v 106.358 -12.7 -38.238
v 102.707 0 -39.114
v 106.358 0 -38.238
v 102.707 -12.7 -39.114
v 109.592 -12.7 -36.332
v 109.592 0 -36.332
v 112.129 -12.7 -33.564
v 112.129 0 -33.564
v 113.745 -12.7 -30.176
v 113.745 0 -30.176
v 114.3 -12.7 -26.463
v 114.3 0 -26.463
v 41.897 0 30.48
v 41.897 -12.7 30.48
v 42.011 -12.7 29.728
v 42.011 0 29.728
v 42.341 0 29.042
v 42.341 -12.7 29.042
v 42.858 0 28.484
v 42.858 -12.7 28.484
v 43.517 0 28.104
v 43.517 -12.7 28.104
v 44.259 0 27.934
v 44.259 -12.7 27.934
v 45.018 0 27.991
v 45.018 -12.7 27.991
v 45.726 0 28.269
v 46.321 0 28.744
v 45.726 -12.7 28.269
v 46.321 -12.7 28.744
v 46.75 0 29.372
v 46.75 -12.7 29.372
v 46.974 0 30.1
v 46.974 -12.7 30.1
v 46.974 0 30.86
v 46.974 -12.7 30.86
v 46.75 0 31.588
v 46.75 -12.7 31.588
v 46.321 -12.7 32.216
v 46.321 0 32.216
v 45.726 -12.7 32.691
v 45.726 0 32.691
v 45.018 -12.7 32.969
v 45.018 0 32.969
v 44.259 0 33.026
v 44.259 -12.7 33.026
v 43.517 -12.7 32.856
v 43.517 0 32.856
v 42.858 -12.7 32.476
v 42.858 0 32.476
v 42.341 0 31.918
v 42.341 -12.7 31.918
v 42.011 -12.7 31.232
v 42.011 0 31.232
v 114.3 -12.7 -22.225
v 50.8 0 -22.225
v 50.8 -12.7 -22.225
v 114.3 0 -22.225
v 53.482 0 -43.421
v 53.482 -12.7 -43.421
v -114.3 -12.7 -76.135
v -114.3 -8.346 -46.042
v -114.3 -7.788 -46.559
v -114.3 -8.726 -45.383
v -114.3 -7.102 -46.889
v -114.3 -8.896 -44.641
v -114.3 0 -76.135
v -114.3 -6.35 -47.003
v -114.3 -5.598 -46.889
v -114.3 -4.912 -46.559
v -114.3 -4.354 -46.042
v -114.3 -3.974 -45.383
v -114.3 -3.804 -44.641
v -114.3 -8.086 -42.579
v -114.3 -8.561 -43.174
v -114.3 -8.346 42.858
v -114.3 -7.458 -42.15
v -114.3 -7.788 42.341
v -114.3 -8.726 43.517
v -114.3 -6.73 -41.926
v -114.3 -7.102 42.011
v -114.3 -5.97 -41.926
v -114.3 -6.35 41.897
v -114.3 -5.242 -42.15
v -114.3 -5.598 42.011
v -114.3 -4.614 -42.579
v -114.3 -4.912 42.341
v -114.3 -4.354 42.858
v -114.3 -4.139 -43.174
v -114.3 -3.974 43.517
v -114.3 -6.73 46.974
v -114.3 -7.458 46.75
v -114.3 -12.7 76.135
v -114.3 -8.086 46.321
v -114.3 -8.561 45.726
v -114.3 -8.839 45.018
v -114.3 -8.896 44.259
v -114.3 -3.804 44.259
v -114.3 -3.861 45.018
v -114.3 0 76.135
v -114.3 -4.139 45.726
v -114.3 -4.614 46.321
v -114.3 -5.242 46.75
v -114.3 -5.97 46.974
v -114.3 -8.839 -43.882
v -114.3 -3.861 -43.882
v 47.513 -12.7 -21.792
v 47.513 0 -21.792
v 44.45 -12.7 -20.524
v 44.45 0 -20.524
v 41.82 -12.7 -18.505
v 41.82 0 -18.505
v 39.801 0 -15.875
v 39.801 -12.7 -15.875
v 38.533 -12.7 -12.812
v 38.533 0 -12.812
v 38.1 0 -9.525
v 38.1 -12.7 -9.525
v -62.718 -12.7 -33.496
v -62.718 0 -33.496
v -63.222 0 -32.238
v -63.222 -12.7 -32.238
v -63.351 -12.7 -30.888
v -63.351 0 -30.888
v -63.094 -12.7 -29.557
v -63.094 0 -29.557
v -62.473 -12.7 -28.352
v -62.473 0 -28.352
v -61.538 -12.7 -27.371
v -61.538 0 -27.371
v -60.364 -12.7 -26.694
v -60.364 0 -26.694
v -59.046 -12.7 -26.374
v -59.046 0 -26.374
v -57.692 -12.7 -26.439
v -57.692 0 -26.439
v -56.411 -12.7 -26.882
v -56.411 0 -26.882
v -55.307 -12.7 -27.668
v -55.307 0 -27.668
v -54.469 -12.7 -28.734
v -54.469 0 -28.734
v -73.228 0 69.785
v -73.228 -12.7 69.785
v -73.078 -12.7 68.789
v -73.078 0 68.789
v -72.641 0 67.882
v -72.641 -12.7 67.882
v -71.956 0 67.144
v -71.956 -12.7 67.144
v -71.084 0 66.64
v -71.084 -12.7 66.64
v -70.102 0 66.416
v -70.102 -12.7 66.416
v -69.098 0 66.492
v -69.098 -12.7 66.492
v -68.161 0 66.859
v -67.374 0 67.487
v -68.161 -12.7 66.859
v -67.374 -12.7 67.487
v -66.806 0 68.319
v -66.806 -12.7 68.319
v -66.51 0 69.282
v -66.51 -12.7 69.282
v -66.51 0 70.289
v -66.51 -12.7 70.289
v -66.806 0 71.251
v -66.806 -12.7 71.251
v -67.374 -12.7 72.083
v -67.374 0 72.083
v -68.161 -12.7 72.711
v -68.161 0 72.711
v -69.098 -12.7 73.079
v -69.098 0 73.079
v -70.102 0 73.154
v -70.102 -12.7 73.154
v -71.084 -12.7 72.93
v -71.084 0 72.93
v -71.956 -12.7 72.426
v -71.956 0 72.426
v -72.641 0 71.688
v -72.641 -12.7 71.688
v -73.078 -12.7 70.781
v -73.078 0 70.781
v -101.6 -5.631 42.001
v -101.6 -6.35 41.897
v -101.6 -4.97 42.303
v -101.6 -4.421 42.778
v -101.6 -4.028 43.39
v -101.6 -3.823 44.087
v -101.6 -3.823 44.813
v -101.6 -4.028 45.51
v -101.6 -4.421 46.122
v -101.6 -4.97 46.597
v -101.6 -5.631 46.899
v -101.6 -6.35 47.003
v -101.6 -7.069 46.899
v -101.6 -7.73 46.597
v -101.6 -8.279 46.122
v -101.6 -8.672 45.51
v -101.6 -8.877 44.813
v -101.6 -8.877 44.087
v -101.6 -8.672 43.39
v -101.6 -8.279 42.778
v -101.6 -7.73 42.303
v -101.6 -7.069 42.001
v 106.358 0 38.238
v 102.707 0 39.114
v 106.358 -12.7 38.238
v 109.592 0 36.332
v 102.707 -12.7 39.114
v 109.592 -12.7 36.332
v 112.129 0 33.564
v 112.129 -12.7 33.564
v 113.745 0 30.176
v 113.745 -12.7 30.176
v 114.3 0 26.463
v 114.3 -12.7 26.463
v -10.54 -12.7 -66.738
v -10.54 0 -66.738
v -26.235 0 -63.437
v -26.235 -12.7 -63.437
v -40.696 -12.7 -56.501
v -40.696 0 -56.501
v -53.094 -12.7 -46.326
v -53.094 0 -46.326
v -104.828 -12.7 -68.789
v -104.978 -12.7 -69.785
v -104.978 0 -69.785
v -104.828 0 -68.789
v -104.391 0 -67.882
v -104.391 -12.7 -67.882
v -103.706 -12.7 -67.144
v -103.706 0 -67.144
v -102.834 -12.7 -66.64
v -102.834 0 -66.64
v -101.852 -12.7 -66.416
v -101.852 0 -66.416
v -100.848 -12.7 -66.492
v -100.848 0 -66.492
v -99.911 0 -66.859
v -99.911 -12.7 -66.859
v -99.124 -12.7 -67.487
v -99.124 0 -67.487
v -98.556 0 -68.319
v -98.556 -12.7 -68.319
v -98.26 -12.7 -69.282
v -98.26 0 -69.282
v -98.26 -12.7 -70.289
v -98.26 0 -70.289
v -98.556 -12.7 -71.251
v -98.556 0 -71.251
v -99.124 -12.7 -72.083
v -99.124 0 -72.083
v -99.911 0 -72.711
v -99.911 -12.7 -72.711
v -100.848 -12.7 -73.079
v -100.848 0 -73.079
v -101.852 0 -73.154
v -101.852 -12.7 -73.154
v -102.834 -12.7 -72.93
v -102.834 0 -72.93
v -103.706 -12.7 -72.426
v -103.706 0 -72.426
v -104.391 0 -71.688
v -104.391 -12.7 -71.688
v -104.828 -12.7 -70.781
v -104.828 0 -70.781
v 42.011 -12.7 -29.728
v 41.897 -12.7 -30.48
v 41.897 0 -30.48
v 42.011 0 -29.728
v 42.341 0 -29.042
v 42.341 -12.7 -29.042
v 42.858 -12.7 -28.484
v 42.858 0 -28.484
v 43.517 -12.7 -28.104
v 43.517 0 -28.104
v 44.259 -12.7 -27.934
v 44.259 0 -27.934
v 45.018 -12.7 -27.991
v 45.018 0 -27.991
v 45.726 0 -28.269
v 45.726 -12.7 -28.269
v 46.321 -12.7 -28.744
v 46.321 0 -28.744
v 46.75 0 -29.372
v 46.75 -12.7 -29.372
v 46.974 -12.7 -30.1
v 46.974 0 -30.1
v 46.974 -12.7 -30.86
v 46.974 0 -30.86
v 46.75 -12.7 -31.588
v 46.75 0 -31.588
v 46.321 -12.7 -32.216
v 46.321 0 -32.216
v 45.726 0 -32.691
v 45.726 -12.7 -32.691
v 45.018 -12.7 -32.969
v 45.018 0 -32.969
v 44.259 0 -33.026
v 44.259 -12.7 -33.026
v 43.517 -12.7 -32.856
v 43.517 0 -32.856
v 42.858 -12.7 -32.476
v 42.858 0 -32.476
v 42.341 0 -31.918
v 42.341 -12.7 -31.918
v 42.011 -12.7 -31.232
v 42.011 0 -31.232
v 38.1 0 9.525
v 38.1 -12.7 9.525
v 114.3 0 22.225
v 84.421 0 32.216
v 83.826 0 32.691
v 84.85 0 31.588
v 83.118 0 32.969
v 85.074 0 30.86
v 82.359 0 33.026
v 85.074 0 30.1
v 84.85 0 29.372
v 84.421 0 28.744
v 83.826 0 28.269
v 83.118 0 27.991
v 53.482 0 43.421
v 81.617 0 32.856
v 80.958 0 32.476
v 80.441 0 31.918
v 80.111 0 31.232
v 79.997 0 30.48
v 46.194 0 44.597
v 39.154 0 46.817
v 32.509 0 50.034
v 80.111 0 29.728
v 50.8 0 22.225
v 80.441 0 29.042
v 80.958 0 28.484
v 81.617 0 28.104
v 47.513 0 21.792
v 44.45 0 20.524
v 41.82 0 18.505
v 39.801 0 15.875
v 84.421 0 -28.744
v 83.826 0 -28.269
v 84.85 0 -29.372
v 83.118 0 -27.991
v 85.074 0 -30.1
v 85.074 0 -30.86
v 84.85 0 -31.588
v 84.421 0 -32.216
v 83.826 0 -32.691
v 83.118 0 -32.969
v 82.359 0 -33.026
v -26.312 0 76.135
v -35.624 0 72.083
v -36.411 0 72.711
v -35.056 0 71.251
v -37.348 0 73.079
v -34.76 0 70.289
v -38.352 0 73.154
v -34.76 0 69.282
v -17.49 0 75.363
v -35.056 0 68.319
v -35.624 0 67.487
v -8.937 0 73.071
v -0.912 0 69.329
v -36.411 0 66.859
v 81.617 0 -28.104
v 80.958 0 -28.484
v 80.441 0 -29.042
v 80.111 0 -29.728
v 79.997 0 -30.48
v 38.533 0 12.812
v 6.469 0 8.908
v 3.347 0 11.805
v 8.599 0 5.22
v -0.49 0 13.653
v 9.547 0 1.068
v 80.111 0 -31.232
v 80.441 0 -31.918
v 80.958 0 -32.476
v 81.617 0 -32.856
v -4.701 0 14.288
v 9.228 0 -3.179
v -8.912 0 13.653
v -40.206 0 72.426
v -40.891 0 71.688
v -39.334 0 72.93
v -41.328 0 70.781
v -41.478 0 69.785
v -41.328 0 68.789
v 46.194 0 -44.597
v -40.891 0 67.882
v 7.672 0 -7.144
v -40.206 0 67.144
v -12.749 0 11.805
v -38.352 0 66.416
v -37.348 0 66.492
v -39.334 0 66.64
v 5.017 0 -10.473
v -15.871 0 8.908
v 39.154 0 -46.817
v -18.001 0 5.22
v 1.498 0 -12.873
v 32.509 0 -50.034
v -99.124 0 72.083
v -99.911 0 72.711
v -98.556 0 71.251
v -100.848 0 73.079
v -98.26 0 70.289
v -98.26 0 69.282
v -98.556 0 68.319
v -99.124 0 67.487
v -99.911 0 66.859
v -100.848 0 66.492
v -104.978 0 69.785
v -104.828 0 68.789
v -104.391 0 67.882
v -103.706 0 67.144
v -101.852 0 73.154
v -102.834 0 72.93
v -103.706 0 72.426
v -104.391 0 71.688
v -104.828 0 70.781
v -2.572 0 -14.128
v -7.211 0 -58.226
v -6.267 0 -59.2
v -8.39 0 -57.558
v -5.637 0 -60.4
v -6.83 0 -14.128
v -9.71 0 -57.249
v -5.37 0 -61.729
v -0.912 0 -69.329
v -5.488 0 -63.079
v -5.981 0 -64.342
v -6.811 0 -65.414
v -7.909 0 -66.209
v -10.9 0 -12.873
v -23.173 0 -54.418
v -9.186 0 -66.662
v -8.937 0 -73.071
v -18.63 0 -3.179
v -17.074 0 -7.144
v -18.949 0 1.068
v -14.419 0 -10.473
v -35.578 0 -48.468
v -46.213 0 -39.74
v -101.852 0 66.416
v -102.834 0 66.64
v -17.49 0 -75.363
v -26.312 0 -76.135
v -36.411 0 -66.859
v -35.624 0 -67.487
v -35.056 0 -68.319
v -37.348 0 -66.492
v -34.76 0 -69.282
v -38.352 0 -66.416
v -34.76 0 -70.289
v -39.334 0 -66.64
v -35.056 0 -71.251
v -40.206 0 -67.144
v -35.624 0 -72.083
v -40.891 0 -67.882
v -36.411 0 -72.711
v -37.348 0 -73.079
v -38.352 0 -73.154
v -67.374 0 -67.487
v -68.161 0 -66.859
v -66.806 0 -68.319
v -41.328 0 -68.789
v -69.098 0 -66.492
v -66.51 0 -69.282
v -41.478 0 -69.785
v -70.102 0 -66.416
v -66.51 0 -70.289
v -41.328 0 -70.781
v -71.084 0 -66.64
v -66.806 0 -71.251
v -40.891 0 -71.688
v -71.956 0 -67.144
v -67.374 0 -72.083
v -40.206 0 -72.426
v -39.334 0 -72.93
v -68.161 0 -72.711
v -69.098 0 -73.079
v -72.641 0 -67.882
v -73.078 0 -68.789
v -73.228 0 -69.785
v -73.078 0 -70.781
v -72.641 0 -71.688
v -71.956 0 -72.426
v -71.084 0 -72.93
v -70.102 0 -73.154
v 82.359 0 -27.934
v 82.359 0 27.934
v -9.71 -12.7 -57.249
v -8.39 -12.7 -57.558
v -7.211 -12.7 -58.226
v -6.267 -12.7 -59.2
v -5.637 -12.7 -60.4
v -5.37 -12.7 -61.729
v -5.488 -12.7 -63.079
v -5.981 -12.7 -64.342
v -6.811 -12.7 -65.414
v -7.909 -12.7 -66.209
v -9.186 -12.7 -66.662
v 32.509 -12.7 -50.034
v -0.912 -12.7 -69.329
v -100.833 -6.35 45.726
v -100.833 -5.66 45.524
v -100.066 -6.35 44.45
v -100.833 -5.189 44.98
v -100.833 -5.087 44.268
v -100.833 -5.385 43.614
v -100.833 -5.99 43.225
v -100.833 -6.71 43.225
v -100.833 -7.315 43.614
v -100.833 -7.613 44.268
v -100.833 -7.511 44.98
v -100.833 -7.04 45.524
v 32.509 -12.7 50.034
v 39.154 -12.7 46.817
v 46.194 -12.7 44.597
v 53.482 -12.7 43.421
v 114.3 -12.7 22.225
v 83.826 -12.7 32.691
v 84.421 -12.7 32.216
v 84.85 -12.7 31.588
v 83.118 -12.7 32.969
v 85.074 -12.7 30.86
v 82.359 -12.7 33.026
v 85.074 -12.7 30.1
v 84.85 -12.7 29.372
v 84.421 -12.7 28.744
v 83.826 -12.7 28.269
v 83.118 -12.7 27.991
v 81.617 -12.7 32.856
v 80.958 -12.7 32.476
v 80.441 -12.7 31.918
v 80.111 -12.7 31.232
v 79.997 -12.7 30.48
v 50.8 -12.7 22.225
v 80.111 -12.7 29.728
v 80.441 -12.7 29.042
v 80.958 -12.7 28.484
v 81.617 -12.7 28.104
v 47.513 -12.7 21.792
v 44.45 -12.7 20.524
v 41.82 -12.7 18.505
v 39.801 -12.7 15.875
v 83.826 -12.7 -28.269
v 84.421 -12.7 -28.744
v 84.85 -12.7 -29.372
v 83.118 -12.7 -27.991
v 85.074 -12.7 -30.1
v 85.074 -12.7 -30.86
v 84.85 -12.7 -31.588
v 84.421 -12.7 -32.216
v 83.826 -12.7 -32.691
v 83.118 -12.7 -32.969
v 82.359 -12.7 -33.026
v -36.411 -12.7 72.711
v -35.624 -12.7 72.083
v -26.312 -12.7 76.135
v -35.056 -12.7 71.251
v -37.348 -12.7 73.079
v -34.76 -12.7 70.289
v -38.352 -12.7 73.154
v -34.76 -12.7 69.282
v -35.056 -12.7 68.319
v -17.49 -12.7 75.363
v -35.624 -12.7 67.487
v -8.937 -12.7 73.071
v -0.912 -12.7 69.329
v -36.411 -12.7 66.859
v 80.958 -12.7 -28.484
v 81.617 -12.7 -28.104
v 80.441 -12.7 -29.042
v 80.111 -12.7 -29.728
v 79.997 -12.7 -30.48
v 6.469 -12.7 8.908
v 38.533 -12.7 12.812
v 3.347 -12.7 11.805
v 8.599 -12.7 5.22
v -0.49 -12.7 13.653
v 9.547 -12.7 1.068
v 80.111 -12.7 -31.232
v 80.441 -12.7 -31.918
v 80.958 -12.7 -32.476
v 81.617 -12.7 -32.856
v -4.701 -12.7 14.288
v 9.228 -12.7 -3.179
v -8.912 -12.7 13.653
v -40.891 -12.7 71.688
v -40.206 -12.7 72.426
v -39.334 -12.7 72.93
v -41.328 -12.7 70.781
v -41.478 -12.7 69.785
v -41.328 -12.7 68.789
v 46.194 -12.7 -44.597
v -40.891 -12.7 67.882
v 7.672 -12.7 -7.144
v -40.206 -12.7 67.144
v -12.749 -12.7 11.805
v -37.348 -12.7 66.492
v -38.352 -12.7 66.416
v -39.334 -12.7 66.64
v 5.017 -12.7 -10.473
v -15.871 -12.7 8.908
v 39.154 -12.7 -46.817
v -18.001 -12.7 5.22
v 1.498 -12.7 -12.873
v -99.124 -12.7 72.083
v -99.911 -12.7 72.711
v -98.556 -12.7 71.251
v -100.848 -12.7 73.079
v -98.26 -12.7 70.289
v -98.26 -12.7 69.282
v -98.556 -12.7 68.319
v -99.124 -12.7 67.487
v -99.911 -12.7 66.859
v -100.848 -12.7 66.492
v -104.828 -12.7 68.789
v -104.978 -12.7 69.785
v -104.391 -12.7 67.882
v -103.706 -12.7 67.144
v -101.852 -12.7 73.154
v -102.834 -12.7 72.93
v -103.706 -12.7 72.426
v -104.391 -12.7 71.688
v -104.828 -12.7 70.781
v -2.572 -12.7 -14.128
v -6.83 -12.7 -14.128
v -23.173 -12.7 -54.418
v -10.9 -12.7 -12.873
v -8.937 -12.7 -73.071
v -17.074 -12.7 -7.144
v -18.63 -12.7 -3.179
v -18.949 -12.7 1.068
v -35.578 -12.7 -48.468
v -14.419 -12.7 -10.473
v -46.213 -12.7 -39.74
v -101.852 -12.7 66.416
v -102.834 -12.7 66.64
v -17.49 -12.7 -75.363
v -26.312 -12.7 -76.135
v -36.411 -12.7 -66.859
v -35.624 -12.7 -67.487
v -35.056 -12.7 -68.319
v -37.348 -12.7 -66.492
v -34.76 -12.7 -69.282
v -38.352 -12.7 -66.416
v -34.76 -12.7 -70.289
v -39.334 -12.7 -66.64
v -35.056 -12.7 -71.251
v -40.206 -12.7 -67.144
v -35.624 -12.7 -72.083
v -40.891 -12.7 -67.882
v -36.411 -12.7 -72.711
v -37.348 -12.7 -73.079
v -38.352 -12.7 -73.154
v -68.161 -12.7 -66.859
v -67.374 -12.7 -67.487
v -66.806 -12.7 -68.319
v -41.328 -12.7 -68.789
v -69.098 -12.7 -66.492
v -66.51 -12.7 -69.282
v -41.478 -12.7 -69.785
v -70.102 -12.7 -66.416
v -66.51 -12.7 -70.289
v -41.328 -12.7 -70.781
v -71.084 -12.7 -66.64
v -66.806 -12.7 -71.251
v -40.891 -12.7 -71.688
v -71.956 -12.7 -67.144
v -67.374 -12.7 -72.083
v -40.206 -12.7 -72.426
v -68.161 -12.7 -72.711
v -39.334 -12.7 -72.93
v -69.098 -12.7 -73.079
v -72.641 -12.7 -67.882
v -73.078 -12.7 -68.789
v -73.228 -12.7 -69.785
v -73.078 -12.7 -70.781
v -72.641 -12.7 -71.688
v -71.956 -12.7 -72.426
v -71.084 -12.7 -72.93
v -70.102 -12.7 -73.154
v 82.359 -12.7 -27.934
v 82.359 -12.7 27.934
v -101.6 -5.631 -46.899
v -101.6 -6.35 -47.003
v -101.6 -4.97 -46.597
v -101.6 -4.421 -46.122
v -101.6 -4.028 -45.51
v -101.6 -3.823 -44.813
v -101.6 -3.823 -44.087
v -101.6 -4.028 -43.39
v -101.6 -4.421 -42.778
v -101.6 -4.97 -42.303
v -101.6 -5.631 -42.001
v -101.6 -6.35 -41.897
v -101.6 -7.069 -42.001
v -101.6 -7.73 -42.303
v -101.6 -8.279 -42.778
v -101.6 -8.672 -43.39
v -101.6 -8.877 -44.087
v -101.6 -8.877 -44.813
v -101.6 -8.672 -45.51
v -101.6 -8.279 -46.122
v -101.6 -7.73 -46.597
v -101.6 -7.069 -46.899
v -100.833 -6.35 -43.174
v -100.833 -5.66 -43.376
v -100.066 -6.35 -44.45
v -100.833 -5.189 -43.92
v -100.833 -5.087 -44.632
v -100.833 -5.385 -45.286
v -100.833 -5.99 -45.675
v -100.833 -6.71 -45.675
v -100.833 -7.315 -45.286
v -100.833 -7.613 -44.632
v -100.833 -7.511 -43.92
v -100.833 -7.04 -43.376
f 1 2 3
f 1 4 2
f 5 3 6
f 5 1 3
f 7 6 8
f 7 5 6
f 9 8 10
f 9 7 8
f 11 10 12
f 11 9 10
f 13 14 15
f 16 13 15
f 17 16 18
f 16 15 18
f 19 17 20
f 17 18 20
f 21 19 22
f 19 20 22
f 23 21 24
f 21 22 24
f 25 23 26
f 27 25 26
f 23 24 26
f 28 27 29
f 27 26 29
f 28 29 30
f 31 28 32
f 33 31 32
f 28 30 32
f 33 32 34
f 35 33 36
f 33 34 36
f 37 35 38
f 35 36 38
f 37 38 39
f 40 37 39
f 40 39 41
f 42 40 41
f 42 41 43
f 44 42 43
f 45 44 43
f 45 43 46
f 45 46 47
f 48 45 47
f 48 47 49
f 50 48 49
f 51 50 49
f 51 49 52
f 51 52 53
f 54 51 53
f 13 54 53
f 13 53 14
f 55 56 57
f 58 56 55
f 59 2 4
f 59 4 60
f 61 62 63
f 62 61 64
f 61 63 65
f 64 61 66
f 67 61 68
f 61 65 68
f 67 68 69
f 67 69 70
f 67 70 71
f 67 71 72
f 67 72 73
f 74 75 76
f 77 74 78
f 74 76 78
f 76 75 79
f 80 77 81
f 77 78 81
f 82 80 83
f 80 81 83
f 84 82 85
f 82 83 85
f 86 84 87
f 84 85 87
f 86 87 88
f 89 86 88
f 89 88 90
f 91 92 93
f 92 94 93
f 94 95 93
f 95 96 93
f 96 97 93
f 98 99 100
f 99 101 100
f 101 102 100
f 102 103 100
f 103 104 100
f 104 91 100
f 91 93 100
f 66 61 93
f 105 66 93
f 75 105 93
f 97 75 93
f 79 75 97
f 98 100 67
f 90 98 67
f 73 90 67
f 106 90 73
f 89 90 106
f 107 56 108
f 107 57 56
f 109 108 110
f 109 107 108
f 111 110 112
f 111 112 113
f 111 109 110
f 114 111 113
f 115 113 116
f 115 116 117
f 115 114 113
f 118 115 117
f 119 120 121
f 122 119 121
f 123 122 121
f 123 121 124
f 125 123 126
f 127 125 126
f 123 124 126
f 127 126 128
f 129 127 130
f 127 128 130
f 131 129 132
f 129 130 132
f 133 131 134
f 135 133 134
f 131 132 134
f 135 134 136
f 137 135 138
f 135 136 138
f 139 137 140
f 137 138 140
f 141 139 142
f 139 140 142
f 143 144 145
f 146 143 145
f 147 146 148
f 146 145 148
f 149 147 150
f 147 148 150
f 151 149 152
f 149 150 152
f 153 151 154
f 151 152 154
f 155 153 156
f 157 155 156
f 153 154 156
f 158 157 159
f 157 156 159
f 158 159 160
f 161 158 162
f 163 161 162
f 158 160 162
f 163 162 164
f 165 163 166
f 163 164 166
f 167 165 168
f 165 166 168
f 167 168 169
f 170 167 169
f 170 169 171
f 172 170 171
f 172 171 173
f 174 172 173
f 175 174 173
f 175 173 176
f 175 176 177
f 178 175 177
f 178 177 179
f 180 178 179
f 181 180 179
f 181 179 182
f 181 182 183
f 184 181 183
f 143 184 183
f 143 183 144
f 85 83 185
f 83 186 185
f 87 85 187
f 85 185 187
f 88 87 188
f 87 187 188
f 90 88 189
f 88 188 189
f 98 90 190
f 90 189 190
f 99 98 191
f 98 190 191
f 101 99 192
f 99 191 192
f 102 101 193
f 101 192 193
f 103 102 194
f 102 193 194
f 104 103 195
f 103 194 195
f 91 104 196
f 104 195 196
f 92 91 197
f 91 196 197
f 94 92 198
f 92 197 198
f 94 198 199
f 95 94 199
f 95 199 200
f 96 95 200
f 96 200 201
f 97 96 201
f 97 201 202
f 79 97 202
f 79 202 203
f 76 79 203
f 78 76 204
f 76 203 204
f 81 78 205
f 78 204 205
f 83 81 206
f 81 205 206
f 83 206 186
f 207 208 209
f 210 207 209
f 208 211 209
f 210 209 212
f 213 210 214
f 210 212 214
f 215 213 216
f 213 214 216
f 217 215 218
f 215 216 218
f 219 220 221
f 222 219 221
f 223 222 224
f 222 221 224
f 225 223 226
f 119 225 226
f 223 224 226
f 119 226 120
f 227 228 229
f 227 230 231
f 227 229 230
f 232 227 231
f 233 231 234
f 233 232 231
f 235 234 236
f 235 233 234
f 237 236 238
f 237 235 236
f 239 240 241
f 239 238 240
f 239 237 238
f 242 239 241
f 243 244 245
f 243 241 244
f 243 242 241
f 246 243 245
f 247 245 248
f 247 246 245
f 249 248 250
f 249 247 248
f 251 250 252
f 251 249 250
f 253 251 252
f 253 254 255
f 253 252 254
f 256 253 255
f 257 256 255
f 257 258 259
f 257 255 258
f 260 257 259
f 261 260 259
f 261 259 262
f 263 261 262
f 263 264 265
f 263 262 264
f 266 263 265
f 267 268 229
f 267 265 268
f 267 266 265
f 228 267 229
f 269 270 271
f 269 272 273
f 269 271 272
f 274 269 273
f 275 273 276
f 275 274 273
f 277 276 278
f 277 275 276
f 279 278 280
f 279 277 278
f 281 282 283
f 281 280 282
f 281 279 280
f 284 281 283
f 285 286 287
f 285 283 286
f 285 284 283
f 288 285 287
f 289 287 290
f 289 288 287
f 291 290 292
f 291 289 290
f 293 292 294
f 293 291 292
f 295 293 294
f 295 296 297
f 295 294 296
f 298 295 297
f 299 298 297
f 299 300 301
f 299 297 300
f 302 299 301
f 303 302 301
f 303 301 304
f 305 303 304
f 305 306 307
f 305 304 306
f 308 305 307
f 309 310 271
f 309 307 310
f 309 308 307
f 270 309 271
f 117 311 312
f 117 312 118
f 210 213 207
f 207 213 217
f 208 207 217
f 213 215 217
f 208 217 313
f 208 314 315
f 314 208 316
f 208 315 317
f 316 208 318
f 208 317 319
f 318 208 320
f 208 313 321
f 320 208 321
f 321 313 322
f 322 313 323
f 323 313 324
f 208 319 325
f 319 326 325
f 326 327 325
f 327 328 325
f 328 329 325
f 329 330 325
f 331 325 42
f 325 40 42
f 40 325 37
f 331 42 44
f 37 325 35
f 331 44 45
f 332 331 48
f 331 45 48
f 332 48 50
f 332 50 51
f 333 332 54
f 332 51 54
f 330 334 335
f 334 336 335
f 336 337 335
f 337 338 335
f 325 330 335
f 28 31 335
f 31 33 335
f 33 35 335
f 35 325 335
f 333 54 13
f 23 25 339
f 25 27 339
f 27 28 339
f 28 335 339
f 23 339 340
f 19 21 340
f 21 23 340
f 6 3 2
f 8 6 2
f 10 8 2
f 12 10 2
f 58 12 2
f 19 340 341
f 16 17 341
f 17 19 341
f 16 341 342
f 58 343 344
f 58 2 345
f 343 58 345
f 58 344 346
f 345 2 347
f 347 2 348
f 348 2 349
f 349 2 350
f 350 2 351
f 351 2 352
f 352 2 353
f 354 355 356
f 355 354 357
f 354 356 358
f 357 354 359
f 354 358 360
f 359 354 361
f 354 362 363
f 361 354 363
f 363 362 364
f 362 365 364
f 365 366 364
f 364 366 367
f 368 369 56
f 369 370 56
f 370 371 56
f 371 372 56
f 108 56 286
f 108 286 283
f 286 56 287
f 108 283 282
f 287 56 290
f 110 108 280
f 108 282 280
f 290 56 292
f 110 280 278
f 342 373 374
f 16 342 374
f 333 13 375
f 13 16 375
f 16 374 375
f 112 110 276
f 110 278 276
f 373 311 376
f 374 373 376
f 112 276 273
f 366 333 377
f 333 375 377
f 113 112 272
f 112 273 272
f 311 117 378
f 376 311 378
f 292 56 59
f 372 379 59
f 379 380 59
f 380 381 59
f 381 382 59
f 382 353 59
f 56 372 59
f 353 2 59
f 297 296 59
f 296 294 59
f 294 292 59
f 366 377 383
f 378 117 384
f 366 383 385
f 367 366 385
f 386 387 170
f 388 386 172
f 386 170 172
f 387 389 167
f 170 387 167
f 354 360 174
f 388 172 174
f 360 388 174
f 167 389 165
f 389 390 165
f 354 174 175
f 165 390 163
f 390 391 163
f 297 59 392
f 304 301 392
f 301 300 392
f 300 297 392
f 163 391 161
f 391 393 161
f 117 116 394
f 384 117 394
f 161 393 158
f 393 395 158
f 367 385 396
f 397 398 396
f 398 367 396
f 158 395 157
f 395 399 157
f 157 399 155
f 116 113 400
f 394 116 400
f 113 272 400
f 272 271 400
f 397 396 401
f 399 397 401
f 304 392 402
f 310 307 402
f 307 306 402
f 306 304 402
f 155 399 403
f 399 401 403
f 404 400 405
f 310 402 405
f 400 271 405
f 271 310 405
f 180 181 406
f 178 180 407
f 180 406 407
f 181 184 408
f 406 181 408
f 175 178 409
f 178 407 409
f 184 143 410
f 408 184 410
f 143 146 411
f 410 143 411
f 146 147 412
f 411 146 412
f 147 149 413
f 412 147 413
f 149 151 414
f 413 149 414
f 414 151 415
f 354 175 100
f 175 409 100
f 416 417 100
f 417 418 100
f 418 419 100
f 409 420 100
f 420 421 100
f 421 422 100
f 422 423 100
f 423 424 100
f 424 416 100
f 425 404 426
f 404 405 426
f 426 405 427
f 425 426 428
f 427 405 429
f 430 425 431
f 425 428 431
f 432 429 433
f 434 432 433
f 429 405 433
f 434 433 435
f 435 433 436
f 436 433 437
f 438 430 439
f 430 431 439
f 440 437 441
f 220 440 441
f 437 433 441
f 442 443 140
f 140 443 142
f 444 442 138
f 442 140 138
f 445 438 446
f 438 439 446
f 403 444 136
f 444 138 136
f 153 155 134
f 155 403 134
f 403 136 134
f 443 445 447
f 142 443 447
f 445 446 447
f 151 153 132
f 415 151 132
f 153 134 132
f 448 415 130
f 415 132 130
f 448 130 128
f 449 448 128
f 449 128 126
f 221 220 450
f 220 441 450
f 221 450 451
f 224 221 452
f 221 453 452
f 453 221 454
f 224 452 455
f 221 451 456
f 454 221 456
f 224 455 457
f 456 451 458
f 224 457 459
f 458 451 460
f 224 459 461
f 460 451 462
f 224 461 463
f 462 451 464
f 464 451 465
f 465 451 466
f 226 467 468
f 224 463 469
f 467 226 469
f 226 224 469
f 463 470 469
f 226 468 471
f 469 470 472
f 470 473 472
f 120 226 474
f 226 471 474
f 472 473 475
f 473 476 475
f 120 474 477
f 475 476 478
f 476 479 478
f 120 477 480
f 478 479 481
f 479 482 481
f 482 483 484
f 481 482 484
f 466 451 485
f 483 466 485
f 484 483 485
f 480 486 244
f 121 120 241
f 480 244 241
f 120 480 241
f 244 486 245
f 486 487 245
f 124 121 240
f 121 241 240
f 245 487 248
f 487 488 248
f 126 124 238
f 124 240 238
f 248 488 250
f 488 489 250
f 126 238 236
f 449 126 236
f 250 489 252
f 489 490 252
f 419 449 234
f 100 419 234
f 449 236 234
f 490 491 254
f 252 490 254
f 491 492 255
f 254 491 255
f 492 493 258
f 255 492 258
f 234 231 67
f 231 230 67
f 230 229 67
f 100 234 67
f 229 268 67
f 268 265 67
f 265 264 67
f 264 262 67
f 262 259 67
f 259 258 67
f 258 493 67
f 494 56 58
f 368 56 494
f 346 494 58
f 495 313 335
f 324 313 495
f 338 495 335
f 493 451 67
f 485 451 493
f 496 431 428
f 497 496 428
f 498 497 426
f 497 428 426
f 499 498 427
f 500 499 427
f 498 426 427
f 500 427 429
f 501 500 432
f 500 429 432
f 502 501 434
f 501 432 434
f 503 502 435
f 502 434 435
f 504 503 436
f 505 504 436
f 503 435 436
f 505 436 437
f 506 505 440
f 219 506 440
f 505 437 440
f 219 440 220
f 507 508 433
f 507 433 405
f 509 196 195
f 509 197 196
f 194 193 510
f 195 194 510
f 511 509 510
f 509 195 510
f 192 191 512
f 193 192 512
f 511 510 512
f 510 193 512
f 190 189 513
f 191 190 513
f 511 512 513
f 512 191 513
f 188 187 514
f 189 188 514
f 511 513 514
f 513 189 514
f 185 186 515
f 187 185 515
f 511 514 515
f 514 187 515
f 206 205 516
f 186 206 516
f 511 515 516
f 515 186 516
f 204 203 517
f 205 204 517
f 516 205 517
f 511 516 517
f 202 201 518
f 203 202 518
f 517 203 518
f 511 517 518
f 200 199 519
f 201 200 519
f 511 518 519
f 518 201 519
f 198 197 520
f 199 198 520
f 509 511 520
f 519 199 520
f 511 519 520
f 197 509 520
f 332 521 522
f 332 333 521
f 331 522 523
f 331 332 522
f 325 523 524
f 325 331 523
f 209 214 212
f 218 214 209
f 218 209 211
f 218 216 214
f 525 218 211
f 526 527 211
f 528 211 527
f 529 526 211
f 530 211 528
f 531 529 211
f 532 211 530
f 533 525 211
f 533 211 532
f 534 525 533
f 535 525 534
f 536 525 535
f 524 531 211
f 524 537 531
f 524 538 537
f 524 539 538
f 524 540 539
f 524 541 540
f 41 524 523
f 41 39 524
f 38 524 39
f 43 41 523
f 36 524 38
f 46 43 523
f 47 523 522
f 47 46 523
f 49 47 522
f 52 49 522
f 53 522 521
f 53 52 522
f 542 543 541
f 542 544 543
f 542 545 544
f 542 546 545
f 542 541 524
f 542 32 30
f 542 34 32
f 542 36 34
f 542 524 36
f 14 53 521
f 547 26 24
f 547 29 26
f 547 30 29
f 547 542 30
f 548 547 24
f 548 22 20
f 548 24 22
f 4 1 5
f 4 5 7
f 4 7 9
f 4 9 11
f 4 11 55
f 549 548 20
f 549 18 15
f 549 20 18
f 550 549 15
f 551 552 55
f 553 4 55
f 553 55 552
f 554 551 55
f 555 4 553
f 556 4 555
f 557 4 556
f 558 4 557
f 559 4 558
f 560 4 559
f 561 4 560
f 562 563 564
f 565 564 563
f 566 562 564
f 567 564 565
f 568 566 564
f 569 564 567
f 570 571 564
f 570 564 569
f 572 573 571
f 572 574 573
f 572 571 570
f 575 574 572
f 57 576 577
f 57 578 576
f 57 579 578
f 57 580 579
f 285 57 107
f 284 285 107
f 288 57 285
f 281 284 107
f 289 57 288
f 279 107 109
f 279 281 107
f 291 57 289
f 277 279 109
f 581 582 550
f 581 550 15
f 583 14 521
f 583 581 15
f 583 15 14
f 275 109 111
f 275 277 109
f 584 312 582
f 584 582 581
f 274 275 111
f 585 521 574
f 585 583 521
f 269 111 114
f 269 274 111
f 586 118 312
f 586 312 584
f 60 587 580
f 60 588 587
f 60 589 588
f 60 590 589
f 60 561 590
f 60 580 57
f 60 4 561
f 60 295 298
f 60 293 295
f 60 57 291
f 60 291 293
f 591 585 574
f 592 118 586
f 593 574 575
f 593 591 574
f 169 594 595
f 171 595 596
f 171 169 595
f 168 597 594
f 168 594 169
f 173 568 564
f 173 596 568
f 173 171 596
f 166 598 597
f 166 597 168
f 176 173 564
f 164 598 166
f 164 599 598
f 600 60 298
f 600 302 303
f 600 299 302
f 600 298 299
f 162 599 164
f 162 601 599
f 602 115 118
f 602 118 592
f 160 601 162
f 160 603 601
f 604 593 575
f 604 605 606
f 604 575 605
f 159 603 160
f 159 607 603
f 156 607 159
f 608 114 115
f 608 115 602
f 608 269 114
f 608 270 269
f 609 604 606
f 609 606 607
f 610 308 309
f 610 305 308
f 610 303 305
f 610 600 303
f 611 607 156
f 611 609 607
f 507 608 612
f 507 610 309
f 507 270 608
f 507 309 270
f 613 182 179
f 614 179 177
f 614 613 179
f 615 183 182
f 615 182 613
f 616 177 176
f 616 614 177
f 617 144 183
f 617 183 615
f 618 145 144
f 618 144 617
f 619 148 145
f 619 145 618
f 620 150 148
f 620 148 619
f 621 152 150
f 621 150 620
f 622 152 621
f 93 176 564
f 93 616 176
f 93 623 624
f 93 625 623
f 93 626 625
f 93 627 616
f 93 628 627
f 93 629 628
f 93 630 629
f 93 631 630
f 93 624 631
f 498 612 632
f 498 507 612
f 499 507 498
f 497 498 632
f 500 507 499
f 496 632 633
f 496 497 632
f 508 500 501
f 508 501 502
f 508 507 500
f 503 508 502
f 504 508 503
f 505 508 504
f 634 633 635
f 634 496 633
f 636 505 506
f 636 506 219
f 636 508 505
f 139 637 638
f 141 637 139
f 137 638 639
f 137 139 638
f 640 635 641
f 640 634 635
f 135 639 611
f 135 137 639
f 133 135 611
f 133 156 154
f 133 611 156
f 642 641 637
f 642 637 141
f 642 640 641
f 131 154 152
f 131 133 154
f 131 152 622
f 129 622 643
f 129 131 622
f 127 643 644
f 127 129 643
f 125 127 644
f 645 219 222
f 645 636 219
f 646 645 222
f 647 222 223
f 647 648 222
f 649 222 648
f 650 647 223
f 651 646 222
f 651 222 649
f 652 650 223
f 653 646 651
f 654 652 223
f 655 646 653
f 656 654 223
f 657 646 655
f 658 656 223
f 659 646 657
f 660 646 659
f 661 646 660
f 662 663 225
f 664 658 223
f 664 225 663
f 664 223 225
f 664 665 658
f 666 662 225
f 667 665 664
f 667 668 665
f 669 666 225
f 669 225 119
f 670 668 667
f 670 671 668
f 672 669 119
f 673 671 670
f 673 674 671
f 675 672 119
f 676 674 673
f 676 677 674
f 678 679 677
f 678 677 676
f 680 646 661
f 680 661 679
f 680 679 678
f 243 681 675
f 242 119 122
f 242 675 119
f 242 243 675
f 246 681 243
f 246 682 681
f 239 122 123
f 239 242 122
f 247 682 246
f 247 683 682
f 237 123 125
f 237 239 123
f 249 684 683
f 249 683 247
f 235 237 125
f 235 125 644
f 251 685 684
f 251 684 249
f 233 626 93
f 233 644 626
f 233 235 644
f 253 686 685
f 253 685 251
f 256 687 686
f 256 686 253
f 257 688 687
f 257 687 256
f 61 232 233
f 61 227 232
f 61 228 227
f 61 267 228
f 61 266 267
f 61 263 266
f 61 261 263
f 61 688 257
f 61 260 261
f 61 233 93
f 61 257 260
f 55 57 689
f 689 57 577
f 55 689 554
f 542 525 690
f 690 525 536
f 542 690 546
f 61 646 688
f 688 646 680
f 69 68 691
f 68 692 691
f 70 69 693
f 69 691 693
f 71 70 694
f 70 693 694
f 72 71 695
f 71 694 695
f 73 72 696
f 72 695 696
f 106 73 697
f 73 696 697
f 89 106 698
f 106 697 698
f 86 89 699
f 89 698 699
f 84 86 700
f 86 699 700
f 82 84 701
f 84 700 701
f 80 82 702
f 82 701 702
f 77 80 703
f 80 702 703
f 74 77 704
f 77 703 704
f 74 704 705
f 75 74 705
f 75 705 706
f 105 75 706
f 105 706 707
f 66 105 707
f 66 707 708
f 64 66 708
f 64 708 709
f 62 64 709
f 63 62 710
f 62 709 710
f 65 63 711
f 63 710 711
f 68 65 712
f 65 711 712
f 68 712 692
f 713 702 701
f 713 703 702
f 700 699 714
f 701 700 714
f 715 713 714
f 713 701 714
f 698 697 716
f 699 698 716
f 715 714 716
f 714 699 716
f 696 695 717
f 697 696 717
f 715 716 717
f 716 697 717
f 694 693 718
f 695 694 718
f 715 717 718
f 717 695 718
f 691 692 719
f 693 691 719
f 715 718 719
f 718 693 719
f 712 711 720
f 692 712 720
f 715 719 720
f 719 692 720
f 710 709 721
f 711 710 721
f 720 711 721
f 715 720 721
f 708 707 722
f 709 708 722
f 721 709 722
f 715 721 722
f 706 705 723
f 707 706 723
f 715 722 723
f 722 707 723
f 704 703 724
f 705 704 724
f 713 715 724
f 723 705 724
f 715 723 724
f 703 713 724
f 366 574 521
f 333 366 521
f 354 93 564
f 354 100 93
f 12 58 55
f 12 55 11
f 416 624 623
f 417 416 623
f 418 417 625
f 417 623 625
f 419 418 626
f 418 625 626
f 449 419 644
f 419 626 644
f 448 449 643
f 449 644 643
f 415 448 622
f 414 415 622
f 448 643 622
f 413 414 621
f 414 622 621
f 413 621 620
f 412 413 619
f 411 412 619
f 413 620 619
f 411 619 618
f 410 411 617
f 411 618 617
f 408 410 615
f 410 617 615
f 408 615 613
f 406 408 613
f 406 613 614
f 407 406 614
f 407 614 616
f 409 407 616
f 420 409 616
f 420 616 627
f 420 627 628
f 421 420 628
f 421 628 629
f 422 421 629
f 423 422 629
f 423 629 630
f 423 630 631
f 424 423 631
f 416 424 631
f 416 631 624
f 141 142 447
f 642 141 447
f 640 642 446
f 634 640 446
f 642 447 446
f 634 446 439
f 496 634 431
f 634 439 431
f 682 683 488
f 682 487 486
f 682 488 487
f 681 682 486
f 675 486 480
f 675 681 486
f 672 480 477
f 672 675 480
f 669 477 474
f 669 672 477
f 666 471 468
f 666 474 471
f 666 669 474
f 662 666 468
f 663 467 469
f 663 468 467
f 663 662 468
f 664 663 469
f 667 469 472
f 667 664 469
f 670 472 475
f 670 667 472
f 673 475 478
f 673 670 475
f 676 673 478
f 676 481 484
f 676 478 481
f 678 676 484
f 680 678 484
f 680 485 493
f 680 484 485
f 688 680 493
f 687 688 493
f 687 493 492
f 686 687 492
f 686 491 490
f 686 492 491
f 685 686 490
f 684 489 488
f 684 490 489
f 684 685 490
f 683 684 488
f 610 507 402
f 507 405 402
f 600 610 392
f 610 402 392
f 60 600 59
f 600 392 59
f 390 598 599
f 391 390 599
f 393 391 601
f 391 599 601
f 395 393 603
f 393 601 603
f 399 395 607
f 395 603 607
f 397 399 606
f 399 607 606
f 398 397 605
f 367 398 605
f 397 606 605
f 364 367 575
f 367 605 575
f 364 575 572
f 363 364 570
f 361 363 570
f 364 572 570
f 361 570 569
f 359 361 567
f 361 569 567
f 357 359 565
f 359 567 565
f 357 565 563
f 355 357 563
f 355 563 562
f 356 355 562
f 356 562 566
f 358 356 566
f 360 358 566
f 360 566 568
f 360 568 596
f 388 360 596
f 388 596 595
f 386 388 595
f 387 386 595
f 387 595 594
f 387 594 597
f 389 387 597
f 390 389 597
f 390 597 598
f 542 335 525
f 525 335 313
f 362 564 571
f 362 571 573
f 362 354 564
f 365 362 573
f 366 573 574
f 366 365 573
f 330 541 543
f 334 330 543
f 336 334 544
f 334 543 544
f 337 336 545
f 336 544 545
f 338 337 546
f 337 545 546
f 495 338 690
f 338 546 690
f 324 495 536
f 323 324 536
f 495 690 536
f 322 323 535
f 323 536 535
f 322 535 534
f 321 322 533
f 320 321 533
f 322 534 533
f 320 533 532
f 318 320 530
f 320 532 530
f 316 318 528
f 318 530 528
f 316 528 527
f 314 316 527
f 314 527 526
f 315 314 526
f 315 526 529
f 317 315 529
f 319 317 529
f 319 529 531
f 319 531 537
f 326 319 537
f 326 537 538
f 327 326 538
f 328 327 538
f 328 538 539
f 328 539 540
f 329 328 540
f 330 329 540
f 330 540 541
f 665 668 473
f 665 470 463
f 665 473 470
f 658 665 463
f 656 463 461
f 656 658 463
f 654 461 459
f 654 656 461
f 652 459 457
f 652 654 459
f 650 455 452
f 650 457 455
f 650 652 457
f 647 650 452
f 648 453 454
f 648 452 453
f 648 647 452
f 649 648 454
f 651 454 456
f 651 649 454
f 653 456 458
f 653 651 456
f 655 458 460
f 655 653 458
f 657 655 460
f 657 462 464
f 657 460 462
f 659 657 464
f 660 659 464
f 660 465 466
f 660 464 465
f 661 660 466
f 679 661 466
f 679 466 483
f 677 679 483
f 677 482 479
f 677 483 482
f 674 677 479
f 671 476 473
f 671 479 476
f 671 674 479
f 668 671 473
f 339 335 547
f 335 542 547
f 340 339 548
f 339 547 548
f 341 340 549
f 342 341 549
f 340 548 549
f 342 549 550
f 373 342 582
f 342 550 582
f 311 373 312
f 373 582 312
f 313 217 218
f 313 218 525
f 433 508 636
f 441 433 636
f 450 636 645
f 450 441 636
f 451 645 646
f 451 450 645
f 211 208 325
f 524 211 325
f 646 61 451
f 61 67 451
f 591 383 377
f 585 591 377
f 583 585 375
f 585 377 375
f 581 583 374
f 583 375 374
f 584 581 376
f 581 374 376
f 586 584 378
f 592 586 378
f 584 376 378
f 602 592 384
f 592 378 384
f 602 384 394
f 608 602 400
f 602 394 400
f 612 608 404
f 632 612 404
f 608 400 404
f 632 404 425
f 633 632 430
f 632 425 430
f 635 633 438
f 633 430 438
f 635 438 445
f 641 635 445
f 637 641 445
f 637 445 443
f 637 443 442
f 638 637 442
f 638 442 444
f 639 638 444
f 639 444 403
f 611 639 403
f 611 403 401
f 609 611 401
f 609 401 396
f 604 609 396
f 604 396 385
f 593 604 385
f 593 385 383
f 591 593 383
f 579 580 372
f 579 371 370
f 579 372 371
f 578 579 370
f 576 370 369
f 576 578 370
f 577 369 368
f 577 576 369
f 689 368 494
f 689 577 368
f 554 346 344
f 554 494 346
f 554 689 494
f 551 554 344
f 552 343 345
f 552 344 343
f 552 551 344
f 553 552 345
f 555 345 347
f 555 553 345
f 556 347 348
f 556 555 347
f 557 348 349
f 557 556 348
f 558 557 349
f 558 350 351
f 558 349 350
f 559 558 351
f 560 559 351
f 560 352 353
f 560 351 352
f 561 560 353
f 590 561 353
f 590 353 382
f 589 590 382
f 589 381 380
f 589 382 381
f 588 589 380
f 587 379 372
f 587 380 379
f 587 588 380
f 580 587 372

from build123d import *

# Parameters (mm, degrees)
SKETCH2_W                       = 228.6
SKETCH2_H                       = 152.4
BOSS_EXTRUDE1_DEPTH             = 12.7
SKETCH4_W                       = 76.2
SKETCH4_H                       = 44.45
CUT_EXTRUDE1_DEPTH              = 138.957312238
SKETCH5_R                       = 14.2875
CUT_EXTRUDE2_DEPTH              = 138.957312238
CUT_EXTRUDE4_DEPTH              = 138.957312238
TAP_DRILL_FOR_1_4_20_TAP2_D     = 5.1054
FILLET1_R                       = 12.7
TAP_DRILL_FOR_1_4_20_TAP1_D     = 5.1054
TAP_DRILL_FOR_1_4_20_TAP1_DEPTH = 12.7
TAP_DRILL_FOR_1_4_20_TAP1_TIP   = 1.533816902
SKETCH16_W                      = 101.6
SKETCH16_H                      = 12.7
BOSS_EXTRUDE2_DEPTH             = 26.924
BOSS_EXTRUDE3_DEPTH             = 12.7
F_1_4_CLEARANCE_HOLE2_D         = 6.7564
FILLET3_R                       = 50.8
CUT_EXTRUDE5_DEPTH              = 12.7


with BuildPart() as part:
    # Sketch2 → Boss-Extrude1 (new body)
    with BuildSketch(Plane(origin=(0, 0, 0), x_dir=(1, 0, 0), z_dir=(0, 1, 0))):
        Rectangle(SKETCH2_W, SKETCH2_H)
    extrude(amount=-BOSS_EXTRUDE1_DEPTH)

    # Sketch4 → Cut-Extrude1 (cut, through all)
    with BuildSketch(Plane(origin=(0, 0, 0), x_dir=(1, 0, 0), z_dir=(0, 1, 0))):
        with Locations((76.2, 0)):
            Rectangle(SKETCH4_W, SKETCH4_H)
    extrude(amount=-CUT_EXTRUDE1_DEPTH, mode=Mode.SUBTRACT)

    # Sketch5 → Cut-Extrude2 (cut, through all)
    with BuildSketch(Plane(origin=(0, 0, 0), x_dir=(1, 0, 0), z_dir=(0, 1, 0))):
        with Locations(Location((-4.700997292, 0, 0), (0, 0, 270))):
            Circle(SKETCH5_R)
    extrude(amount=-CUT_EXTRUDE2_DEPTH, mode=Mode.SUBTRACT)

    # Sketch8 → Cut-Extrude4 (cut, through all)
    with BuildSketch(Plane(origin=(0, 0, 0), x_dir=(1, 0, 0), z_dir=(0, 1, 0))):
        Polygon((114.3, -38.1), (-12.7, -49.211060268), (-114.3, -49.211060268), (-114.3, -76.2), (114.3, -76.2), align=None)
    cut_extrude4 = extrude(amount=-CUT_EXTRUDE4_DEPTH, mode=Mode.SUBTRACT)

    # Tap Drill for 1/4-20 Tap2 (through all)
    with Locations(Plane(origin=(0, 0, 0), x_dir=(1, 0, 0), z_dir=(0, 1, 0))):
        with Locations((82.55, -30.48), (44.45, -30.48)):
            tap_drill_for_1_4_20_tap2 = Hole(TAP_DRILL_FOR_1_4_20_TAP2_D / 2)

    # Mirror1: Cut-Extrude4, Tap Drill for 1/4-20 Tap2 across plane
    add(cut_extrude4.mirror(Plane.XY), mode=Mode.SUBTRACT)
    add(tap_drill_for_1_4_20_tap2.mirror(Plane.XY), mode=Mode.SUBTRACT)

    # Fillet1
    fillet1_edges = [part.edges().sort_by_distance(p)[0] for p in [
        (38.1, -6.35, 22.225),
        (38.1, -6.35, -22.225),
        (114.3, -6.35, 38.1),
        (114.3, -6.35, -38.1),
    ]]
    fillet(fillet1_edges, radius=FILLET1_R)

    # Tap Drill for 1/4-20 Tap1
    with Locations(Plane.ZY.offset(114.3)):
        with Locations((-44.45, -6.35), (44.45, -6.35)):
            Hole(TAP_DRILL_FOR_1_4_20_TAP1_D / 2, depth=TAP_DRILL_FOR_1_4_20_TAP1_DEPTH)
            with Locations((0, 0, -(TAP_DRILL_FOR_1_4_20_TAP1_DEPTH + TAP_DRILL_FOR_1_4_20_TAP1_TIP / 2))):  # 118° drill point
                Cone(0, TAP_DRILL_FOR_1_4_20_TAP1_D / 2, TAP_DRILL_FOR_1_4_20_TAP1_TIP, mode=Mode.SUBTRACT)

    # Sketch16 → Boss-Extrude2 (add)
    with BuildSketch(Plane.XY.offset(49.211060268)):
        with Locations((-63.5, -6.35)):
            Rectangle(SKETCH16_W, SKETCH16_H)
    boss_extrude2 = extrude(amount=BOSS_EXTRUDE2_DEPTH)

    # Sketch17 → Boss-Extrude3 (add)
    with BuildSketch(Plane.XZ.offset(12.7)):
        Polygon((-12.7, 76.135060268), (42.262462232, 44.402467903), (-12.7, 49.211060268), align=None)
    boss_extrude3 = extrude(amount=-BOSS_EXTRUDE3_DEPTH)

    # 1/4 Clearance Hole2 (through all)
    with Locations(Plane(origin=(0, 0, 0), x_dir=(1, 0, 0), z_dir=(0, 1, 0))):
        with Locations((-101.6, -69.785060268), (-69.85, -69.785060268), (-38.1, -69.785060268)):
            f_1_4_clearance_hole2 = Hole(F_1_4_CLEARANCE_HOLE2_D / 2)

    # Mirror2: Boss-Extrude2, Boss-Extrude3, 1/4 Clearance Hole2 across plane
    add(boss_extrude2.mirror(Plane.XY))
    add(boss_extrude3.mirror(Plane.XY))
    add(f_1_4_clearance_hole2.mirror(Plane.XY), mode=Mode.SUBTRACT)

    # Fillet3
    fillet3_edges = [part.edges().sort_by_distance(p)[0] for p in [
        (-12.7, -6.35, 76.135060268),
        (42.262462232, -6.35, 44.402467903),
        (-12.7, -6.35, -76.135060268),
        (42.262462232, -6.35, -44.402467903),
    ]]
    fillet(fillet3_edges, radius=FILLET3_R)

    # Sketch20 → Cut-Extrude5 (cut)
    with BuildSketch(Plane(origin=(0, 0, 0), x_dir=(1, 0, 0), z_dir=(0, 1, 0))):
        with BuildLine():
            ThreePointArc((-10.539781096, 66.737573312), (-40.696044012, 56.500901434), (-62.718206863, 33.49625))
            ThreePointArc((-62.718206863, 33.49625), (-60.975010878, 26.990554014), (-54.469314892, 28.73375))
            ThreePointArc((-54.469314892, 28.73375), (-35.578265243, 48.467597912), (-9.709622646, 57.248818813))
            ThreePointArc((-9.709622646, 57.248818813), (-5.380324622, 62.408275287), (-10.539781096, 66.737573312))
        make_face()
    extrude(amount=-CUT_EXTRUDE5_DEPTH, mode=Mode.SUBTRACT)


solid = part.part
